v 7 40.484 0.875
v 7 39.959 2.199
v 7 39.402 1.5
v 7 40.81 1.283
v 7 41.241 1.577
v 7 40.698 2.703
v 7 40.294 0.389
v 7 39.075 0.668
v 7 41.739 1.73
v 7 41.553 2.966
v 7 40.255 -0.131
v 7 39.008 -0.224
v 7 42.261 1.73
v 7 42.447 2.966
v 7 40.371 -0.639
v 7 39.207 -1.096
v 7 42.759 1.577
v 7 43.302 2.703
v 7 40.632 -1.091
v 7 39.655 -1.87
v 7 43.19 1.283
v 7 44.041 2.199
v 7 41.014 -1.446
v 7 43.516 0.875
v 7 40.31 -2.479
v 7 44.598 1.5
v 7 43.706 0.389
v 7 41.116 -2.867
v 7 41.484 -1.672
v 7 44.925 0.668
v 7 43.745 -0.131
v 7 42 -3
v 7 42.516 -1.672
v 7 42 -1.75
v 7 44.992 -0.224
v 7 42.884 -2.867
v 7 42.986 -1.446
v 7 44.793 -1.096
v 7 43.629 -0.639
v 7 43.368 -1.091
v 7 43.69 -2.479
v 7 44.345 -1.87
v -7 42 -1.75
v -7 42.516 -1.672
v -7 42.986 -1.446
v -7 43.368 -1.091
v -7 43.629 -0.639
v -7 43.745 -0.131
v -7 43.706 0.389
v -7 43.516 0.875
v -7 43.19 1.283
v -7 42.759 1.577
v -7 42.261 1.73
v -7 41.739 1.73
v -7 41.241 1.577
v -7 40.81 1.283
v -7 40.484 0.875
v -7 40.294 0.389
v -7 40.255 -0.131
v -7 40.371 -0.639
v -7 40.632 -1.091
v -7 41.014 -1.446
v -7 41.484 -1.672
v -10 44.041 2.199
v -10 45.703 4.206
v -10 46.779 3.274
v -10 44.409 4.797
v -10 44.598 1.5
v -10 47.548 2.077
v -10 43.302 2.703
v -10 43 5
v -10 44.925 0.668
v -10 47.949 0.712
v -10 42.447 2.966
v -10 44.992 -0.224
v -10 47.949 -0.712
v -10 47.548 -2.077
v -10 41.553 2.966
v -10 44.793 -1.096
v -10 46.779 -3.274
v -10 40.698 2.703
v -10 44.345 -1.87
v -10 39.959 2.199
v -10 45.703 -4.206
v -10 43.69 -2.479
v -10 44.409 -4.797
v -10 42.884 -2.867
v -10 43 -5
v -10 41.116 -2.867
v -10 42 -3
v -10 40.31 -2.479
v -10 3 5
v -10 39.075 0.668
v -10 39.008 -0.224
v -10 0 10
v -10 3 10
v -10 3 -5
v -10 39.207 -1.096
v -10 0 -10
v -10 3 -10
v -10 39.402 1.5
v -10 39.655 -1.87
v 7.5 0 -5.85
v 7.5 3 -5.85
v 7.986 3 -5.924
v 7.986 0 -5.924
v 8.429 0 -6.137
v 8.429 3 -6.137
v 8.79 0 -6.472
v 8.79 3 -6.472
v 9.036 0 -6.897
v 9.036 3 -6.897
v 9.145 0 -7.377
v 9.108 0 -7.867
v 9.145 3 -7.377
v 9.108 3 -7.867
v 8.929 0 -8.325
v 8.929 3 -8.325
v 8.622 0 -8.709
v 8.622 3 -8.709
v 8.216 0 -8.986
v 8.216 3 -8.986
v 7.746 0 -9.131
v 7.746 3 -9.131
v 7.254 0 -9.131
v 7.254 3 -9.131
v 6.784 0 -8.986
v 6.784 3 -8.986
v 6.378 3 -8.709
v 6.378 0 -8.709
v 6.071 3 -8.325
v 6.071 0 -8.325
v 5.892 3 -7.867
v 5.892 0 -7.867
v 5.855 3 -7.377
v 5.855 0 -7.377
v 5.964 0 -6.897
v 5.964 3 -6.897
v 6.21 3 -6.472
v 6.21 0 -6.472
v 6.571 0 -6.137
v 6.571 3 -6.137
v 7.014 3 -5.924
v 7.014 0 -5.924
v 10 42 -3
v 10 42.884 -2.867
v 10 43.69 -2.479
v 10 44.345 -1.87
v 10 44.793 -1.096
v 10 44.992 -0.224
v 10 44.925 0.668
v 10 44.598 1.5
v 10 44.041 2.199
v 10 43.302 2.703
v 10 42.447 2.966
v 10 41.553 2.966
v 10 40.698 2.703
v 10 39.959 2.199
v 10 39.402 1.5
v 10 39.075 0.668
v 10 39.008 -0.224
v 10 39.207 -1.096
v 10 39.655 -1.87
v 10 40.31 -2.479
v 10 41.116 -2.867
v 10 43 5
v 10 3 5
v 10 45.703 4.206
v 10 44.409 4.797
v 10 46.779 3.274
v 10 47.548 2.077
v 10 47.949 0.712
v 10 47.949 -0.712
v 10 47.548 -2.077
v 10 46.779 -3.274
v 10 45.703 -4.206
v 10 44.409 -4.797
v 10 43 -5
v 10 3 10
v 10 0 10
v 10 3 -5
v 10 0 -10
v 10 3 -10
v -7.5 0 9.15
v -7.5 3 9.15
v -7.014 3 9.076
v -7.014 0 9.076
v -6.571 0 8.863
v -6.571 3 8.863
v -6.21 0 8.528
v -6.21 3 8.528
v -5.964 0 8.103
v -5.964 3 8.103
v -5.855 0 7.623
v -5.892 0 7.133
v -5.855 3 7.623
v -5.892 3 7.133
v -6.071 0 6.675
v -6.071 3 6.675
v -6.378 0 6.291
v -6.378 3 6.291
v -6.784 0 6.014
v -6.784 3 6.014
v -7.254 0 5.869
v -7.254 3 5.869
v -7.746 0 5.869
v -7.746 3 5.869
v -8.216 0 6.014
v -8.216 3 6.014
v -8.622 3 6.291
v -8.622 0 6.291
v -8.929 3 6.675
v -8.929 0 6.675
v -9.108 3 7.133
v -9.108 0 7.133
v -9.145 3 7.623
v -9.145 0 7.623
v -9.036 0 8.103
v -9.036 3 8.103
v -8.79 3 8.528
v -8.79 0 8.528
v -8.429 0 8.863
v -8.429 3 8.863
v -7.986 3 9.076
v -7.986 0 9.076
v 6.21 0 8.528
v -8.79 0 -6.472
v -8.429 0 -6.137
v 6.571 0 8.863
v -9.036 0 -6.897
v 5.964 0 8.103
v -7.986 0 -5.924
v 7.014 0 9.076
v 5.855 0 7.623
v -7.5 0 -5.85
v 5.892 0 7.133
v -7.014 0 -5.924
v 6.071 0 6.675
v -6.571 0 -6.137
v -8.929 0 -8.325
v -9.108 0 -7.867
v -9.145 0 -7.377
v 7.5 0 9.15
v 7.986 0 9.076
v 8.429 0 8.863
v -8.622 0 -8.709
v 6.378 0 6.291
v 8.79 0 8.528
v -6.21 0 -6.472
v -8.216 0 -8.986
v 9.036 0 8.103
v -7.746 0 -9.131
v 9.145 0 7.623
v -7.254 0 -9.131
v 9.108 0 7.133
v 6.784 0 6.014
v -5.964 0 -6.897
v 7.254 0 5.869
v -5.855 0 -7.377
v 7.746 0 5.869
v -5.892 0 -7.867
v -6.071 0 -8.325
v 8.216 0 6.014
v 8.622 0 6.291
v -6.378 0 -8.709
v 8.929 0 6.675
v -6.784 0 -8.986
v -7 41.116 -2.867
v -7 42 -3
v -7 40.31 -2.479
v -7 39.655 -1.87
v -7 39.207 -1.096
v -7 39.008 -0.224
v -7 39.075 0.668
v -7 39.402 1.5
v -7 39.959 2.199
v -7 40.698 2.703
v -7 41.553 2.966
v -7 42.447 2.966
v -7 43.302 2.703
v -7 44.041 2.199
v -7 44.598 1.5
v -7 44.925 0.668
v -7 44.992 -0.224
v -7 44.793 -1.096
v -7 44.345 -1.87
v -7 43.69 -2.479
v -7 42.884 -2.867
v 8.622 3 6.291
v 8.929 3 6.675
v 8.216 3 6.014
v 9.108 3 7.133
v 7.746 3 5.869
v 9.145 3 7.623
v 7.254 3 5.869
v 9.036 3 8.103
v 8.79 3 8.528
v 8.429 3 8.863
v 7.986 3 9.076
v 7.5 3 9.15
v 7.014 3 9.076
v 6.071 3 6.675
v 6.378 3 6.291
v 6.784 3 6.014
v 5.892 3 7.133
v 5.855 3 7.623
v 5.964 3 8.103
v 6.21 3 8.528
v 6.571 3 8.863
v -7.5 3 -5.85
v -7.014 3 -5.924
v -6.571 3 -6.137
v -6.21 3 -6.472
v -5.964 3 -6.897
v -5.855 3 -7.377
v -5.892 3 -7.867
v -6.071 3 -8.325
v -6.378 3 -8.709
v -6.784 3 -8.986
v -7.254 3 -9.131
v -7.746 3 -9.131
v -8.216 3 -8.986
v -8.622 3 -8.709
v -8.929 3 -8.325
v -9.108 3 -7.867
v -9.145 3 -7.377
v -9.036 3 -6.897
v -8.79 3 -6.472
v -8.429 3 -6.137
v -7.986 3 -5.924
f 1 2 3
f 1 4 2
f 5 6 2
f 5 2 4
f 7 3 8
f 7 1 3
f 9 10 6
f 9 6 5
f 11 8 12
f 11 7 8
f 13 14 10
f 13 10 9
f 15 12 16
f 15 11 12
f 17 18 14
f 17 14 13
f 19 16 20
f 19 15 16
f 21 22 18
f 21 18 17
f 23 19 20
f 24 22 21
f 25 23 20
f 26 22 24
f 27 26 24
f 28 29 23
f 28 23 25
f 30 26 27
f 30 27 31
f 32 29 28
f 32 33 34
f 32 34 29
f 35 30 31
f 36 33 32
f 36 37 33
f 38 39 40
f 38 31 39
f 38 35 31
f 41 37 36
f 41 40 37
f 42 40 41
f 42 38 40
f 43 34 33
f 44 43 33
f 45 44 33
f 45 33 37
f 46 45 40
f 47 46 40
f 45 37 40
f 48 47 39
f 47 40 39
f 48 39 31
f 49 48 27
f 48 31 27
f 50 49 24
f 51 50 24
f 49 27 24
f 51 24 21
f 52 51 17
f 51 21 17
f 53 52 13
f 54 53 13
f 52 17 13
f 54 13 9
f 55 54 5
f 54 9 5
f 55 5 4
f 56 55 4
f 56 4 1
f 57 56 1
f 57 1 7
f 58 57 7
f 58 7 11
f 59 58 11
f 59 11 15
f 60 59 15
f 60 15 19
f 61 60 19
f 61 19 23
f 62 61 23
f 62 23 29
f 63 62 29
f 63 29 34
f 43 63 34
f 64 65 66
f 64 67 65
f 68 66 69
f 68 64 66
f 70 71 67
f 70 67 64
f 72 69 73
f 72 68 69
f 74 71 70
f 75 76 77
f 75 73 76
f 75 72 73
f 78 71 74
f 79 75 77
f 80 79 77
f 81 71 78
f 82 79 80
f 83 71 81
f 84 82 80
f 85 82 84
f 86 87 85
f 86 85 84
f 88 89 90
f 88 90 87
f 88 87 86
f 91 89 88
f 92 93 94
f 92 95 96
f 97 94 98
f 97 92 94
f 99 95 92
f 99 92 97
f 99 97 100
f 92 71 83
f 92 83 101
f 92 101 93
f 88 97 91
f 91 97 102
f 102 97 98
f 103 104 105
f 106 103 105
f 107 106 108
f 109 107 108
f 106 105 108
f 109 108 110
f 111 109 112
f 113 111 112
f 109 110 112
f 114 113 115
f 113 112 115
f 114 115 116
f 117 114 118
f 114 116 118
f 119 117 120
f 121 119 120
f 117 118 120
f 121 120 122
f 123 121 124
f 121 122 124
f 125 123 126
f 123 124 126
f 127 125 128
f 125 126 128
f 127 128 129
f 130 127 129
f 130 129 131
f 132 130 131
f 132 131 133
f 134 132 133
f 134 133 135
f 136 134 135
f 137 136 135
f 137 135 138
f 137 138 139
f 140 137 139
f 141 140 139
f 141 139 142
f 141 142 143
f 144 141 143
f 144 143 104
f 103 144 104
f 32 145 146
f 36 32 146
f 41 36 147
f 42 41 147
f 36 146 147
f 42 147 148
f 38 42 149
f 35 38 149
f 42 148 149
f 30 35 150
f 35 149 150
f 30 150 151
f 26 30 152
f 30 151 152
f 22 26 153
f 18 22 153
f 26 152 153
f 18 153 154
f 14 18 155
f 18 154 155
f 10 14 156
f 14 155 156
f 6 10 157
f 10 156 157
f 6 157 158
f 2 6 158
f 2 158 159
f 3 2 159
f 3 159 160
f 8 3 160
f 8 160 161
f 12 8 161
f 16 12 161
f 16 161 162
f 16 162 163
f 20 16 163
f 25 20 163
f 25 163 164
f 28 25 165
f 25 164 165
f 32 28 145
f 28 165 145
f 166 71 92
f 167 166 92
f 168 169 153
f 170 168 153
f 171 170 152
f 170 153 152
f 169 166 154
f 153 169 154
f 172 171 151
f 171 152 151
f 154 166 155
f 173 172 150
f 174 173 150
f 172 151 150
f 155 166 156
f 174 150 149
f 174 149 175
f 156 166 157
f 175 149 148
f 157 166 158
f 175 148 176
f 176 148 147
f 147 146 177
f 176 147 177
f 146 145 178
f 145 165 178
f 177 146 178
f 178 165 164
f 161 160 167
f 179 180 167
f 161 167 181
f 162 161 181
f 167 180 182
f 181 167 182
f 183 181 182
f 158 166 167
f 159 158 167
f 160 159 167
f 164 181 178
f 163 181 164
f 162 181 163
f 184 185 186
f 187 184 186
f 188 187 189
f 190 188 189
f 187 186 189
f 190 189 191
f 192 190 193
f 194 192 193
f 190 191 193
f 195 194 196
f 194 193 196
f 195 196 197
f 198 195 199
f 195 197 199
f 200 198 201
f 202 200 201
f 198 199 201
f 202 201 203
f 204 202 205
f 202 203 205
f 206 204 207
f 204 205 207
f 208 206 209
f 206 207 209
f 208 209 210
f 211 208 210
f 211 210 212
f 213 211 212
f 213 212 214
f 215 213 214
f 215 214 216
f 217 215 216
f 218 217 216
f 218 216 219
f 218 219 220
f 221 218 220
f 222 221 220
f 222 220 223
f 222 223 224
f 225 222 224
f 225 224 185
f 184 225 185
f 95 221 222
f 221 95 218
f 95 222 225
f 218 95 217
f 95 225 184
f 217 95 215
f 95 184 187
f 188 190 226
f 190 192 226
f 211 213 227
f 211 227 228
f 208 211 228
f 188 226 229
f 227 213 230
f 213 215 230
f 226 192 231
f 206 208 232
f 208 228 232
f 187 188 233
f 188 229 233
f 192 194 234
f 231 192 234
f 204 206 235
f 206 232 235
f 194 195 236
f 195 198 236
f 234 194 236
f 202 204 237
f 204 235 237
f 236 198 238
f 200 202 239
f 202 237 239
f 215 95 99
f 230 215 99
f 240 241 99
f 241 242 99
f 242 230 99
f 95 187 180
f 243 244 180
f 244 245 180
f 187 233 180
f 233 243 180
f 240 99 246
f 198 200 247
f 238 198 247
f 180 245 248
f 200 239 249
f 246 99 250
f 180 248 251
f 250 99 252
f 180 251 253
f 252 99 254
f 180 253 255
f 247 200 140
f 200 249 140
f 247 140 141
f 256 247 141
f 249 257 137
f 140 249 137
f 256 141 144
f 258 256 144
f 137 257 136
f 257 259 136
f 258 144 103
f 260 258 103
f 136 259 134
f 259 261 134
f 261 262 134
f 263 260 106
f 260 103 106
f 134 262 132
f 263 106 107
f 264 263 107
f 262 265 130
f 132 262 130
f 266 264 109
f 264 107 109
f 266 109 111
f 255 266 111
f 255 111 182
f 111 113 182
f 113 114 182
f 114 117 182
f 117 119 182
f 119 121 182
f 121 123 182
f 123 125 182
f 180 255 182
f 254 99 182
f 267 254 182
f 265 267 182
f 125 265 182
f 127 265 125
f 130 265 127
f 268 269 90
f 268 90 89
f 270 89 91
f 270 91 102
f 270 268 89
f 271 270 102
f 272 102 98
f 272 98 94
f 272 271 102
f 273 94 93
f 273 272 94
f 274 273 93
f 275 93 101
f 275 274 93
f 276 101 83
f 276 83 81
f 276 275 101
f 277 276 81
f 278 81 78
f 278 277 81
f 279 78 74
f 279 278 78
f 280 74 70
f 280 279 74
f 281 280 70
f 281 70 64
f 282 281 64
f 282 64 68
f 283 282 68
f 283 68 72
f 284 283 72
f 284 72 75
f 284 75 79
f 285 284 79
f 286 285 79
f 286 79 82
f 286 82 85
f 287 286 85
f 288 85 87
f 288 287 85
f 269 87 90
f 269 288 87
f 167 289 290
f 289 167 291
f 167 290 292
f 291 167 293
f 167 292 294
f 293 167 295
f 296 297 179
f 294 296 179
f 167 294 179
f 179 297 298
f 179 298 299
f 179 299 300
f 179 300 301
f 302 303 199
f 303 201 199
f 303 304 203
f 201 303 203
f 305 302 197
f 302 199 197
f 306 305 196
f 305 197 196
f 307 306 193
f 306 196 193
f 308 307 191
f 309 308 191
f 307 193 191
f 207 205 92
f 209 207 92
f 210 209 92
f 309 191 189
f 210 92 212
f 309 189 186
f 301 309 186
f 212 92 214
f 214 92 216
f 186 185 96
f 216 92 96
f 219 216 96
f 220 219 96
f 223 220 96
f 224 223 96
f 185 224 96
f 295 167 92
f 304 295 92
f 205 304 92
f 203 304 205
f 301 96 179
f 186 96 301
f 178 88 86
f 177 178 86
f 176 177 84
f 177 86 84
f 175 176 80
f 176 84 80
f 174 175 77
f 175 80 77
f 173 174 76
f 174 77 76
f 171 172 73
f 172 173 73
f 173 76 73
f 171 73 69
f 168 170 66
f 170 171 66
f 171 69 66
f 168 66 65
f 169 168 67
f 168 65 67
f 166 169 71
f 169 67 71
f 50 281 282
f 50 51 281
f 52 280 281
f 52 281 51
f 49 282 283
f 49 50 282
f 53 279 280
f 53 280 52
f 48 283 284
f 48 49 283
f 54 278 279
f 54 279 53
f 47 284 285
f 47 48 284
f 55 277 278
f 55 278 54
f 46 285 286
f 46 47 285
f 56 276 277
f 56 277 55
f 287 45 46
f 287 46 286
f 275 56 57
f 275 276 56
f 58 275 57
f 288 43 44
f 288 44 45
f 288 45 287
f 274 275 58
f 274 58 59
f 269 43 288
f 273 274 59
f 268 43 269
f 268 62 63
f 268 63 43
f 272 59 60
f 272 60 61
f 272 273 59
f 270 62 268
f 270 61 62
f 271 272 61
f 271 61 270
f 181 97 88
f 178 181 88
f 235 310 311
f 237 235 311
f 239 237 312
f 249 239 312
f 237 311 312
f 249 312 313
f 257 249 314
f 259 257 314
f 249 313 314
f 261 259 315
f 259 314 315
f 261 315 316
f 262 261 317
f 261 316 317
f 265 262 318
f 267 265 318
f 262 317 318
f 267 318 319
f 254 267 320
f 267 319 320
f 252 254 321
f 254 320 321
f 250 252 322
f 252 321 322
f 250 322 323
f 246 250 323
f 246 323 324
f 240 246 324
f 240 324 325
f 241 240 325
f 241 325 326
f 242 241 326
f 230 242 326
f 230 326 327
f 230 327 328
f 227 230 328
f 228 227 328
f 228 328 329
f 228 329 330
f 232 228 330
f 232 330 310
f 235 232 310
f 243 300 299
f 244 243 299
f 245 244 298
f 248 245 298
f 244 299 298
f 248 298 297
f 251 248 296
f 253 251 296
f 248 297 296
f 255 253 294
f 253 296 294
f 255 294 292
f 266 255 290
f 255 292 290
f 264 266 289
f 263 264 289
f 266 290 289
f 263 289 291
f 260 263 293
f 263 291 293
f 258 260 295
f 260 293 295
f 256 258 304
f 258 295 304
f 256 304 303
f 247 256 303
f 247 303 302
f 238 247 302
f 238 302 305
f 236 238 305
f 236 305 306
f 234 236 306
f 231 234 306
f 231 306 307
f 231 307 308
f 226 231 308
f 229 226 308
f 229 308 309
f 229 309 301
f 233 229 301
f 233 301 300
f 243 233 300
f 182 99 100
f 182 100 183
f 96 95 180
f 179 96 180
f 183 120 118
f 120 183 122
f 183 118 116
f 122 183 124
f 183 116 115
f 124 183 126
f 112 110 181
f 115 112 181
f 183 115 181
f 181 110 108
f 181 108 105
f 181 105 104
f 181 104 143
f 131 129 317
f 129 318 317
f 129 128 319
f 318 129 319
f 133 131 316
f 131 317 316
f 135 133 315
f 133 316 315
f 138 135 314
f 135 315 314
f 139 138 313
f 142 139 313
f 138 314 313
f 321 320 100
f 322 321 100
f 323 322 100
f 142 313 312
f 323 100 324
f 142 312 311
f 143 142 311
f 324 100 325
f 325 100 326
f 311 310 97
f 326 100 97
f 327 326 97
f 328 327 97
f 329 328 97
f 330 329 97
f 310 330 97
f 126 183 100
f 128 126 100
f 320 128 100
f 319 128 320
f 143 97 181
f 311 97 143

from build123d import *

# Parameters (mm, degrees)
SKETCH1_W           = 20
SKETCH1_H           = 20
BOSS_EXTRUDE1_DEPTH = 52
SKETCH2_R           = 3
CUT_EXTRUDE1_DEPTH  = 3
SKETCH3_R           = 1.75
CUT_EXTRUDE2_DEPTH  = 56.614746246
CUT_EXTRUDE3_START  = -3
SKETCH4_R           = 3
CUT_EXTRUDE3_DEPTH  = 3
SKETCH5_R           = 1.649559613
CUT_EXTRUDE4_DEPTH  = 54.888774341
CUT_EXTRUDE5_DEPTH  = 57.603886792


with BuildPart() as part:
    # Sketch1 → Boss-Extrude1 (new body)
    with BuildSketch(Plane(origin=(0, 0, 0), x_dir=(1, 0, 0), z_dir=(0, 1, 0))):
        Rectangle(SKETCH1_W, SKETCH1_H)
    extrude(amount=BOSS_EXTRUDE1_DEPTH)

    # Sketch2 → Cut-Extrude1 (cut)
    with BuildSketch(Plane(origin=(10, 0, 0), x_dir=(0, 0, -1), z_dir=(1, 0, 0))):
        with Locations((0, 42)):
            Circle(SKETCH2_R)
    extrude(amount=-CUT_EXTRUDE1_DEPTH, mode=Mode.SUBTRACT)

    # Sketch3 → Cut-Extrude2 (cut, through all)
    with BuildSketch(Plane(origin=(7, 0, 0), x_dir=(0, 0, -1), z_dir=(1, 0, 0))):
        with Locations((0, 42)):
            Circle(SKETCH3_R)
    extrude(amount=-CUT_EXTRUDE2_DEPTH, mode=Mode.SUBTRACT)

    # Sketch4 → Cut-Extrude3 (cut)
    with BuildSketch(Plane.ZY.offset(10).offset(CUT_EXTRUDE3_START)):
        with Locations(Location((0, 42, 0), (0, 0, 180))):
            Circle(SKETCH4_R)
    extrude(amount=CUT_EXTRUDE3_DEPTH, mode=Mode.SUBTRACT)

    # Sketch5 → Cut-Extrude4 (cut, through all)
    with BuildSketch(Plane(origin=(0, 52, 0), x_dir=(1, 0, 0), z_dir=(0, 1, 0))):
        with Locations(Location((-7.5, 7.5, 0), (0, 0, 270))):
            Circle(SKETCH5_R)
        with Locations(Location((7.5, 7.5, 0), (0, 0, 270))):
            Circle(SKETCH5_R)
        with Locations(Location((7.5, -7.5, 0), (0, 0, 270))):
            Circle(SKETCH5_R)
        with Locations(Location((-7.5, -7.5, 0), (0, 0, 270))):
            Circle(SKETCH5_R)
    extrude(amount=-CUT_EXTRUDE4_DEPTH, mode=Mode.SUBTRACT)

    # Sketch6 → Cut-Extrude5 (cut, through all)
    with BuildSketch(Plane.ZY.offset(10)):
        with BuildLine():
            Line((-10, 3), (-5, 3))
            Line((-5, 3), (-5, 43))
            ThreePointArc((-5, 43), (0, 48), (5, 43))
            Line((5, 43), (5, 3))
            Line((5, 3), (10, 3))
            Line((10, 3), (10, 52))
            Line((10, 52), (-10, 52))
            Line((-10, 52), (-10, 3))
        make_face()
    extrude(amount=-CUT_EXTRUDE5_DEPTH, mode=Mode.SUBTRACT)


solid = part.part
